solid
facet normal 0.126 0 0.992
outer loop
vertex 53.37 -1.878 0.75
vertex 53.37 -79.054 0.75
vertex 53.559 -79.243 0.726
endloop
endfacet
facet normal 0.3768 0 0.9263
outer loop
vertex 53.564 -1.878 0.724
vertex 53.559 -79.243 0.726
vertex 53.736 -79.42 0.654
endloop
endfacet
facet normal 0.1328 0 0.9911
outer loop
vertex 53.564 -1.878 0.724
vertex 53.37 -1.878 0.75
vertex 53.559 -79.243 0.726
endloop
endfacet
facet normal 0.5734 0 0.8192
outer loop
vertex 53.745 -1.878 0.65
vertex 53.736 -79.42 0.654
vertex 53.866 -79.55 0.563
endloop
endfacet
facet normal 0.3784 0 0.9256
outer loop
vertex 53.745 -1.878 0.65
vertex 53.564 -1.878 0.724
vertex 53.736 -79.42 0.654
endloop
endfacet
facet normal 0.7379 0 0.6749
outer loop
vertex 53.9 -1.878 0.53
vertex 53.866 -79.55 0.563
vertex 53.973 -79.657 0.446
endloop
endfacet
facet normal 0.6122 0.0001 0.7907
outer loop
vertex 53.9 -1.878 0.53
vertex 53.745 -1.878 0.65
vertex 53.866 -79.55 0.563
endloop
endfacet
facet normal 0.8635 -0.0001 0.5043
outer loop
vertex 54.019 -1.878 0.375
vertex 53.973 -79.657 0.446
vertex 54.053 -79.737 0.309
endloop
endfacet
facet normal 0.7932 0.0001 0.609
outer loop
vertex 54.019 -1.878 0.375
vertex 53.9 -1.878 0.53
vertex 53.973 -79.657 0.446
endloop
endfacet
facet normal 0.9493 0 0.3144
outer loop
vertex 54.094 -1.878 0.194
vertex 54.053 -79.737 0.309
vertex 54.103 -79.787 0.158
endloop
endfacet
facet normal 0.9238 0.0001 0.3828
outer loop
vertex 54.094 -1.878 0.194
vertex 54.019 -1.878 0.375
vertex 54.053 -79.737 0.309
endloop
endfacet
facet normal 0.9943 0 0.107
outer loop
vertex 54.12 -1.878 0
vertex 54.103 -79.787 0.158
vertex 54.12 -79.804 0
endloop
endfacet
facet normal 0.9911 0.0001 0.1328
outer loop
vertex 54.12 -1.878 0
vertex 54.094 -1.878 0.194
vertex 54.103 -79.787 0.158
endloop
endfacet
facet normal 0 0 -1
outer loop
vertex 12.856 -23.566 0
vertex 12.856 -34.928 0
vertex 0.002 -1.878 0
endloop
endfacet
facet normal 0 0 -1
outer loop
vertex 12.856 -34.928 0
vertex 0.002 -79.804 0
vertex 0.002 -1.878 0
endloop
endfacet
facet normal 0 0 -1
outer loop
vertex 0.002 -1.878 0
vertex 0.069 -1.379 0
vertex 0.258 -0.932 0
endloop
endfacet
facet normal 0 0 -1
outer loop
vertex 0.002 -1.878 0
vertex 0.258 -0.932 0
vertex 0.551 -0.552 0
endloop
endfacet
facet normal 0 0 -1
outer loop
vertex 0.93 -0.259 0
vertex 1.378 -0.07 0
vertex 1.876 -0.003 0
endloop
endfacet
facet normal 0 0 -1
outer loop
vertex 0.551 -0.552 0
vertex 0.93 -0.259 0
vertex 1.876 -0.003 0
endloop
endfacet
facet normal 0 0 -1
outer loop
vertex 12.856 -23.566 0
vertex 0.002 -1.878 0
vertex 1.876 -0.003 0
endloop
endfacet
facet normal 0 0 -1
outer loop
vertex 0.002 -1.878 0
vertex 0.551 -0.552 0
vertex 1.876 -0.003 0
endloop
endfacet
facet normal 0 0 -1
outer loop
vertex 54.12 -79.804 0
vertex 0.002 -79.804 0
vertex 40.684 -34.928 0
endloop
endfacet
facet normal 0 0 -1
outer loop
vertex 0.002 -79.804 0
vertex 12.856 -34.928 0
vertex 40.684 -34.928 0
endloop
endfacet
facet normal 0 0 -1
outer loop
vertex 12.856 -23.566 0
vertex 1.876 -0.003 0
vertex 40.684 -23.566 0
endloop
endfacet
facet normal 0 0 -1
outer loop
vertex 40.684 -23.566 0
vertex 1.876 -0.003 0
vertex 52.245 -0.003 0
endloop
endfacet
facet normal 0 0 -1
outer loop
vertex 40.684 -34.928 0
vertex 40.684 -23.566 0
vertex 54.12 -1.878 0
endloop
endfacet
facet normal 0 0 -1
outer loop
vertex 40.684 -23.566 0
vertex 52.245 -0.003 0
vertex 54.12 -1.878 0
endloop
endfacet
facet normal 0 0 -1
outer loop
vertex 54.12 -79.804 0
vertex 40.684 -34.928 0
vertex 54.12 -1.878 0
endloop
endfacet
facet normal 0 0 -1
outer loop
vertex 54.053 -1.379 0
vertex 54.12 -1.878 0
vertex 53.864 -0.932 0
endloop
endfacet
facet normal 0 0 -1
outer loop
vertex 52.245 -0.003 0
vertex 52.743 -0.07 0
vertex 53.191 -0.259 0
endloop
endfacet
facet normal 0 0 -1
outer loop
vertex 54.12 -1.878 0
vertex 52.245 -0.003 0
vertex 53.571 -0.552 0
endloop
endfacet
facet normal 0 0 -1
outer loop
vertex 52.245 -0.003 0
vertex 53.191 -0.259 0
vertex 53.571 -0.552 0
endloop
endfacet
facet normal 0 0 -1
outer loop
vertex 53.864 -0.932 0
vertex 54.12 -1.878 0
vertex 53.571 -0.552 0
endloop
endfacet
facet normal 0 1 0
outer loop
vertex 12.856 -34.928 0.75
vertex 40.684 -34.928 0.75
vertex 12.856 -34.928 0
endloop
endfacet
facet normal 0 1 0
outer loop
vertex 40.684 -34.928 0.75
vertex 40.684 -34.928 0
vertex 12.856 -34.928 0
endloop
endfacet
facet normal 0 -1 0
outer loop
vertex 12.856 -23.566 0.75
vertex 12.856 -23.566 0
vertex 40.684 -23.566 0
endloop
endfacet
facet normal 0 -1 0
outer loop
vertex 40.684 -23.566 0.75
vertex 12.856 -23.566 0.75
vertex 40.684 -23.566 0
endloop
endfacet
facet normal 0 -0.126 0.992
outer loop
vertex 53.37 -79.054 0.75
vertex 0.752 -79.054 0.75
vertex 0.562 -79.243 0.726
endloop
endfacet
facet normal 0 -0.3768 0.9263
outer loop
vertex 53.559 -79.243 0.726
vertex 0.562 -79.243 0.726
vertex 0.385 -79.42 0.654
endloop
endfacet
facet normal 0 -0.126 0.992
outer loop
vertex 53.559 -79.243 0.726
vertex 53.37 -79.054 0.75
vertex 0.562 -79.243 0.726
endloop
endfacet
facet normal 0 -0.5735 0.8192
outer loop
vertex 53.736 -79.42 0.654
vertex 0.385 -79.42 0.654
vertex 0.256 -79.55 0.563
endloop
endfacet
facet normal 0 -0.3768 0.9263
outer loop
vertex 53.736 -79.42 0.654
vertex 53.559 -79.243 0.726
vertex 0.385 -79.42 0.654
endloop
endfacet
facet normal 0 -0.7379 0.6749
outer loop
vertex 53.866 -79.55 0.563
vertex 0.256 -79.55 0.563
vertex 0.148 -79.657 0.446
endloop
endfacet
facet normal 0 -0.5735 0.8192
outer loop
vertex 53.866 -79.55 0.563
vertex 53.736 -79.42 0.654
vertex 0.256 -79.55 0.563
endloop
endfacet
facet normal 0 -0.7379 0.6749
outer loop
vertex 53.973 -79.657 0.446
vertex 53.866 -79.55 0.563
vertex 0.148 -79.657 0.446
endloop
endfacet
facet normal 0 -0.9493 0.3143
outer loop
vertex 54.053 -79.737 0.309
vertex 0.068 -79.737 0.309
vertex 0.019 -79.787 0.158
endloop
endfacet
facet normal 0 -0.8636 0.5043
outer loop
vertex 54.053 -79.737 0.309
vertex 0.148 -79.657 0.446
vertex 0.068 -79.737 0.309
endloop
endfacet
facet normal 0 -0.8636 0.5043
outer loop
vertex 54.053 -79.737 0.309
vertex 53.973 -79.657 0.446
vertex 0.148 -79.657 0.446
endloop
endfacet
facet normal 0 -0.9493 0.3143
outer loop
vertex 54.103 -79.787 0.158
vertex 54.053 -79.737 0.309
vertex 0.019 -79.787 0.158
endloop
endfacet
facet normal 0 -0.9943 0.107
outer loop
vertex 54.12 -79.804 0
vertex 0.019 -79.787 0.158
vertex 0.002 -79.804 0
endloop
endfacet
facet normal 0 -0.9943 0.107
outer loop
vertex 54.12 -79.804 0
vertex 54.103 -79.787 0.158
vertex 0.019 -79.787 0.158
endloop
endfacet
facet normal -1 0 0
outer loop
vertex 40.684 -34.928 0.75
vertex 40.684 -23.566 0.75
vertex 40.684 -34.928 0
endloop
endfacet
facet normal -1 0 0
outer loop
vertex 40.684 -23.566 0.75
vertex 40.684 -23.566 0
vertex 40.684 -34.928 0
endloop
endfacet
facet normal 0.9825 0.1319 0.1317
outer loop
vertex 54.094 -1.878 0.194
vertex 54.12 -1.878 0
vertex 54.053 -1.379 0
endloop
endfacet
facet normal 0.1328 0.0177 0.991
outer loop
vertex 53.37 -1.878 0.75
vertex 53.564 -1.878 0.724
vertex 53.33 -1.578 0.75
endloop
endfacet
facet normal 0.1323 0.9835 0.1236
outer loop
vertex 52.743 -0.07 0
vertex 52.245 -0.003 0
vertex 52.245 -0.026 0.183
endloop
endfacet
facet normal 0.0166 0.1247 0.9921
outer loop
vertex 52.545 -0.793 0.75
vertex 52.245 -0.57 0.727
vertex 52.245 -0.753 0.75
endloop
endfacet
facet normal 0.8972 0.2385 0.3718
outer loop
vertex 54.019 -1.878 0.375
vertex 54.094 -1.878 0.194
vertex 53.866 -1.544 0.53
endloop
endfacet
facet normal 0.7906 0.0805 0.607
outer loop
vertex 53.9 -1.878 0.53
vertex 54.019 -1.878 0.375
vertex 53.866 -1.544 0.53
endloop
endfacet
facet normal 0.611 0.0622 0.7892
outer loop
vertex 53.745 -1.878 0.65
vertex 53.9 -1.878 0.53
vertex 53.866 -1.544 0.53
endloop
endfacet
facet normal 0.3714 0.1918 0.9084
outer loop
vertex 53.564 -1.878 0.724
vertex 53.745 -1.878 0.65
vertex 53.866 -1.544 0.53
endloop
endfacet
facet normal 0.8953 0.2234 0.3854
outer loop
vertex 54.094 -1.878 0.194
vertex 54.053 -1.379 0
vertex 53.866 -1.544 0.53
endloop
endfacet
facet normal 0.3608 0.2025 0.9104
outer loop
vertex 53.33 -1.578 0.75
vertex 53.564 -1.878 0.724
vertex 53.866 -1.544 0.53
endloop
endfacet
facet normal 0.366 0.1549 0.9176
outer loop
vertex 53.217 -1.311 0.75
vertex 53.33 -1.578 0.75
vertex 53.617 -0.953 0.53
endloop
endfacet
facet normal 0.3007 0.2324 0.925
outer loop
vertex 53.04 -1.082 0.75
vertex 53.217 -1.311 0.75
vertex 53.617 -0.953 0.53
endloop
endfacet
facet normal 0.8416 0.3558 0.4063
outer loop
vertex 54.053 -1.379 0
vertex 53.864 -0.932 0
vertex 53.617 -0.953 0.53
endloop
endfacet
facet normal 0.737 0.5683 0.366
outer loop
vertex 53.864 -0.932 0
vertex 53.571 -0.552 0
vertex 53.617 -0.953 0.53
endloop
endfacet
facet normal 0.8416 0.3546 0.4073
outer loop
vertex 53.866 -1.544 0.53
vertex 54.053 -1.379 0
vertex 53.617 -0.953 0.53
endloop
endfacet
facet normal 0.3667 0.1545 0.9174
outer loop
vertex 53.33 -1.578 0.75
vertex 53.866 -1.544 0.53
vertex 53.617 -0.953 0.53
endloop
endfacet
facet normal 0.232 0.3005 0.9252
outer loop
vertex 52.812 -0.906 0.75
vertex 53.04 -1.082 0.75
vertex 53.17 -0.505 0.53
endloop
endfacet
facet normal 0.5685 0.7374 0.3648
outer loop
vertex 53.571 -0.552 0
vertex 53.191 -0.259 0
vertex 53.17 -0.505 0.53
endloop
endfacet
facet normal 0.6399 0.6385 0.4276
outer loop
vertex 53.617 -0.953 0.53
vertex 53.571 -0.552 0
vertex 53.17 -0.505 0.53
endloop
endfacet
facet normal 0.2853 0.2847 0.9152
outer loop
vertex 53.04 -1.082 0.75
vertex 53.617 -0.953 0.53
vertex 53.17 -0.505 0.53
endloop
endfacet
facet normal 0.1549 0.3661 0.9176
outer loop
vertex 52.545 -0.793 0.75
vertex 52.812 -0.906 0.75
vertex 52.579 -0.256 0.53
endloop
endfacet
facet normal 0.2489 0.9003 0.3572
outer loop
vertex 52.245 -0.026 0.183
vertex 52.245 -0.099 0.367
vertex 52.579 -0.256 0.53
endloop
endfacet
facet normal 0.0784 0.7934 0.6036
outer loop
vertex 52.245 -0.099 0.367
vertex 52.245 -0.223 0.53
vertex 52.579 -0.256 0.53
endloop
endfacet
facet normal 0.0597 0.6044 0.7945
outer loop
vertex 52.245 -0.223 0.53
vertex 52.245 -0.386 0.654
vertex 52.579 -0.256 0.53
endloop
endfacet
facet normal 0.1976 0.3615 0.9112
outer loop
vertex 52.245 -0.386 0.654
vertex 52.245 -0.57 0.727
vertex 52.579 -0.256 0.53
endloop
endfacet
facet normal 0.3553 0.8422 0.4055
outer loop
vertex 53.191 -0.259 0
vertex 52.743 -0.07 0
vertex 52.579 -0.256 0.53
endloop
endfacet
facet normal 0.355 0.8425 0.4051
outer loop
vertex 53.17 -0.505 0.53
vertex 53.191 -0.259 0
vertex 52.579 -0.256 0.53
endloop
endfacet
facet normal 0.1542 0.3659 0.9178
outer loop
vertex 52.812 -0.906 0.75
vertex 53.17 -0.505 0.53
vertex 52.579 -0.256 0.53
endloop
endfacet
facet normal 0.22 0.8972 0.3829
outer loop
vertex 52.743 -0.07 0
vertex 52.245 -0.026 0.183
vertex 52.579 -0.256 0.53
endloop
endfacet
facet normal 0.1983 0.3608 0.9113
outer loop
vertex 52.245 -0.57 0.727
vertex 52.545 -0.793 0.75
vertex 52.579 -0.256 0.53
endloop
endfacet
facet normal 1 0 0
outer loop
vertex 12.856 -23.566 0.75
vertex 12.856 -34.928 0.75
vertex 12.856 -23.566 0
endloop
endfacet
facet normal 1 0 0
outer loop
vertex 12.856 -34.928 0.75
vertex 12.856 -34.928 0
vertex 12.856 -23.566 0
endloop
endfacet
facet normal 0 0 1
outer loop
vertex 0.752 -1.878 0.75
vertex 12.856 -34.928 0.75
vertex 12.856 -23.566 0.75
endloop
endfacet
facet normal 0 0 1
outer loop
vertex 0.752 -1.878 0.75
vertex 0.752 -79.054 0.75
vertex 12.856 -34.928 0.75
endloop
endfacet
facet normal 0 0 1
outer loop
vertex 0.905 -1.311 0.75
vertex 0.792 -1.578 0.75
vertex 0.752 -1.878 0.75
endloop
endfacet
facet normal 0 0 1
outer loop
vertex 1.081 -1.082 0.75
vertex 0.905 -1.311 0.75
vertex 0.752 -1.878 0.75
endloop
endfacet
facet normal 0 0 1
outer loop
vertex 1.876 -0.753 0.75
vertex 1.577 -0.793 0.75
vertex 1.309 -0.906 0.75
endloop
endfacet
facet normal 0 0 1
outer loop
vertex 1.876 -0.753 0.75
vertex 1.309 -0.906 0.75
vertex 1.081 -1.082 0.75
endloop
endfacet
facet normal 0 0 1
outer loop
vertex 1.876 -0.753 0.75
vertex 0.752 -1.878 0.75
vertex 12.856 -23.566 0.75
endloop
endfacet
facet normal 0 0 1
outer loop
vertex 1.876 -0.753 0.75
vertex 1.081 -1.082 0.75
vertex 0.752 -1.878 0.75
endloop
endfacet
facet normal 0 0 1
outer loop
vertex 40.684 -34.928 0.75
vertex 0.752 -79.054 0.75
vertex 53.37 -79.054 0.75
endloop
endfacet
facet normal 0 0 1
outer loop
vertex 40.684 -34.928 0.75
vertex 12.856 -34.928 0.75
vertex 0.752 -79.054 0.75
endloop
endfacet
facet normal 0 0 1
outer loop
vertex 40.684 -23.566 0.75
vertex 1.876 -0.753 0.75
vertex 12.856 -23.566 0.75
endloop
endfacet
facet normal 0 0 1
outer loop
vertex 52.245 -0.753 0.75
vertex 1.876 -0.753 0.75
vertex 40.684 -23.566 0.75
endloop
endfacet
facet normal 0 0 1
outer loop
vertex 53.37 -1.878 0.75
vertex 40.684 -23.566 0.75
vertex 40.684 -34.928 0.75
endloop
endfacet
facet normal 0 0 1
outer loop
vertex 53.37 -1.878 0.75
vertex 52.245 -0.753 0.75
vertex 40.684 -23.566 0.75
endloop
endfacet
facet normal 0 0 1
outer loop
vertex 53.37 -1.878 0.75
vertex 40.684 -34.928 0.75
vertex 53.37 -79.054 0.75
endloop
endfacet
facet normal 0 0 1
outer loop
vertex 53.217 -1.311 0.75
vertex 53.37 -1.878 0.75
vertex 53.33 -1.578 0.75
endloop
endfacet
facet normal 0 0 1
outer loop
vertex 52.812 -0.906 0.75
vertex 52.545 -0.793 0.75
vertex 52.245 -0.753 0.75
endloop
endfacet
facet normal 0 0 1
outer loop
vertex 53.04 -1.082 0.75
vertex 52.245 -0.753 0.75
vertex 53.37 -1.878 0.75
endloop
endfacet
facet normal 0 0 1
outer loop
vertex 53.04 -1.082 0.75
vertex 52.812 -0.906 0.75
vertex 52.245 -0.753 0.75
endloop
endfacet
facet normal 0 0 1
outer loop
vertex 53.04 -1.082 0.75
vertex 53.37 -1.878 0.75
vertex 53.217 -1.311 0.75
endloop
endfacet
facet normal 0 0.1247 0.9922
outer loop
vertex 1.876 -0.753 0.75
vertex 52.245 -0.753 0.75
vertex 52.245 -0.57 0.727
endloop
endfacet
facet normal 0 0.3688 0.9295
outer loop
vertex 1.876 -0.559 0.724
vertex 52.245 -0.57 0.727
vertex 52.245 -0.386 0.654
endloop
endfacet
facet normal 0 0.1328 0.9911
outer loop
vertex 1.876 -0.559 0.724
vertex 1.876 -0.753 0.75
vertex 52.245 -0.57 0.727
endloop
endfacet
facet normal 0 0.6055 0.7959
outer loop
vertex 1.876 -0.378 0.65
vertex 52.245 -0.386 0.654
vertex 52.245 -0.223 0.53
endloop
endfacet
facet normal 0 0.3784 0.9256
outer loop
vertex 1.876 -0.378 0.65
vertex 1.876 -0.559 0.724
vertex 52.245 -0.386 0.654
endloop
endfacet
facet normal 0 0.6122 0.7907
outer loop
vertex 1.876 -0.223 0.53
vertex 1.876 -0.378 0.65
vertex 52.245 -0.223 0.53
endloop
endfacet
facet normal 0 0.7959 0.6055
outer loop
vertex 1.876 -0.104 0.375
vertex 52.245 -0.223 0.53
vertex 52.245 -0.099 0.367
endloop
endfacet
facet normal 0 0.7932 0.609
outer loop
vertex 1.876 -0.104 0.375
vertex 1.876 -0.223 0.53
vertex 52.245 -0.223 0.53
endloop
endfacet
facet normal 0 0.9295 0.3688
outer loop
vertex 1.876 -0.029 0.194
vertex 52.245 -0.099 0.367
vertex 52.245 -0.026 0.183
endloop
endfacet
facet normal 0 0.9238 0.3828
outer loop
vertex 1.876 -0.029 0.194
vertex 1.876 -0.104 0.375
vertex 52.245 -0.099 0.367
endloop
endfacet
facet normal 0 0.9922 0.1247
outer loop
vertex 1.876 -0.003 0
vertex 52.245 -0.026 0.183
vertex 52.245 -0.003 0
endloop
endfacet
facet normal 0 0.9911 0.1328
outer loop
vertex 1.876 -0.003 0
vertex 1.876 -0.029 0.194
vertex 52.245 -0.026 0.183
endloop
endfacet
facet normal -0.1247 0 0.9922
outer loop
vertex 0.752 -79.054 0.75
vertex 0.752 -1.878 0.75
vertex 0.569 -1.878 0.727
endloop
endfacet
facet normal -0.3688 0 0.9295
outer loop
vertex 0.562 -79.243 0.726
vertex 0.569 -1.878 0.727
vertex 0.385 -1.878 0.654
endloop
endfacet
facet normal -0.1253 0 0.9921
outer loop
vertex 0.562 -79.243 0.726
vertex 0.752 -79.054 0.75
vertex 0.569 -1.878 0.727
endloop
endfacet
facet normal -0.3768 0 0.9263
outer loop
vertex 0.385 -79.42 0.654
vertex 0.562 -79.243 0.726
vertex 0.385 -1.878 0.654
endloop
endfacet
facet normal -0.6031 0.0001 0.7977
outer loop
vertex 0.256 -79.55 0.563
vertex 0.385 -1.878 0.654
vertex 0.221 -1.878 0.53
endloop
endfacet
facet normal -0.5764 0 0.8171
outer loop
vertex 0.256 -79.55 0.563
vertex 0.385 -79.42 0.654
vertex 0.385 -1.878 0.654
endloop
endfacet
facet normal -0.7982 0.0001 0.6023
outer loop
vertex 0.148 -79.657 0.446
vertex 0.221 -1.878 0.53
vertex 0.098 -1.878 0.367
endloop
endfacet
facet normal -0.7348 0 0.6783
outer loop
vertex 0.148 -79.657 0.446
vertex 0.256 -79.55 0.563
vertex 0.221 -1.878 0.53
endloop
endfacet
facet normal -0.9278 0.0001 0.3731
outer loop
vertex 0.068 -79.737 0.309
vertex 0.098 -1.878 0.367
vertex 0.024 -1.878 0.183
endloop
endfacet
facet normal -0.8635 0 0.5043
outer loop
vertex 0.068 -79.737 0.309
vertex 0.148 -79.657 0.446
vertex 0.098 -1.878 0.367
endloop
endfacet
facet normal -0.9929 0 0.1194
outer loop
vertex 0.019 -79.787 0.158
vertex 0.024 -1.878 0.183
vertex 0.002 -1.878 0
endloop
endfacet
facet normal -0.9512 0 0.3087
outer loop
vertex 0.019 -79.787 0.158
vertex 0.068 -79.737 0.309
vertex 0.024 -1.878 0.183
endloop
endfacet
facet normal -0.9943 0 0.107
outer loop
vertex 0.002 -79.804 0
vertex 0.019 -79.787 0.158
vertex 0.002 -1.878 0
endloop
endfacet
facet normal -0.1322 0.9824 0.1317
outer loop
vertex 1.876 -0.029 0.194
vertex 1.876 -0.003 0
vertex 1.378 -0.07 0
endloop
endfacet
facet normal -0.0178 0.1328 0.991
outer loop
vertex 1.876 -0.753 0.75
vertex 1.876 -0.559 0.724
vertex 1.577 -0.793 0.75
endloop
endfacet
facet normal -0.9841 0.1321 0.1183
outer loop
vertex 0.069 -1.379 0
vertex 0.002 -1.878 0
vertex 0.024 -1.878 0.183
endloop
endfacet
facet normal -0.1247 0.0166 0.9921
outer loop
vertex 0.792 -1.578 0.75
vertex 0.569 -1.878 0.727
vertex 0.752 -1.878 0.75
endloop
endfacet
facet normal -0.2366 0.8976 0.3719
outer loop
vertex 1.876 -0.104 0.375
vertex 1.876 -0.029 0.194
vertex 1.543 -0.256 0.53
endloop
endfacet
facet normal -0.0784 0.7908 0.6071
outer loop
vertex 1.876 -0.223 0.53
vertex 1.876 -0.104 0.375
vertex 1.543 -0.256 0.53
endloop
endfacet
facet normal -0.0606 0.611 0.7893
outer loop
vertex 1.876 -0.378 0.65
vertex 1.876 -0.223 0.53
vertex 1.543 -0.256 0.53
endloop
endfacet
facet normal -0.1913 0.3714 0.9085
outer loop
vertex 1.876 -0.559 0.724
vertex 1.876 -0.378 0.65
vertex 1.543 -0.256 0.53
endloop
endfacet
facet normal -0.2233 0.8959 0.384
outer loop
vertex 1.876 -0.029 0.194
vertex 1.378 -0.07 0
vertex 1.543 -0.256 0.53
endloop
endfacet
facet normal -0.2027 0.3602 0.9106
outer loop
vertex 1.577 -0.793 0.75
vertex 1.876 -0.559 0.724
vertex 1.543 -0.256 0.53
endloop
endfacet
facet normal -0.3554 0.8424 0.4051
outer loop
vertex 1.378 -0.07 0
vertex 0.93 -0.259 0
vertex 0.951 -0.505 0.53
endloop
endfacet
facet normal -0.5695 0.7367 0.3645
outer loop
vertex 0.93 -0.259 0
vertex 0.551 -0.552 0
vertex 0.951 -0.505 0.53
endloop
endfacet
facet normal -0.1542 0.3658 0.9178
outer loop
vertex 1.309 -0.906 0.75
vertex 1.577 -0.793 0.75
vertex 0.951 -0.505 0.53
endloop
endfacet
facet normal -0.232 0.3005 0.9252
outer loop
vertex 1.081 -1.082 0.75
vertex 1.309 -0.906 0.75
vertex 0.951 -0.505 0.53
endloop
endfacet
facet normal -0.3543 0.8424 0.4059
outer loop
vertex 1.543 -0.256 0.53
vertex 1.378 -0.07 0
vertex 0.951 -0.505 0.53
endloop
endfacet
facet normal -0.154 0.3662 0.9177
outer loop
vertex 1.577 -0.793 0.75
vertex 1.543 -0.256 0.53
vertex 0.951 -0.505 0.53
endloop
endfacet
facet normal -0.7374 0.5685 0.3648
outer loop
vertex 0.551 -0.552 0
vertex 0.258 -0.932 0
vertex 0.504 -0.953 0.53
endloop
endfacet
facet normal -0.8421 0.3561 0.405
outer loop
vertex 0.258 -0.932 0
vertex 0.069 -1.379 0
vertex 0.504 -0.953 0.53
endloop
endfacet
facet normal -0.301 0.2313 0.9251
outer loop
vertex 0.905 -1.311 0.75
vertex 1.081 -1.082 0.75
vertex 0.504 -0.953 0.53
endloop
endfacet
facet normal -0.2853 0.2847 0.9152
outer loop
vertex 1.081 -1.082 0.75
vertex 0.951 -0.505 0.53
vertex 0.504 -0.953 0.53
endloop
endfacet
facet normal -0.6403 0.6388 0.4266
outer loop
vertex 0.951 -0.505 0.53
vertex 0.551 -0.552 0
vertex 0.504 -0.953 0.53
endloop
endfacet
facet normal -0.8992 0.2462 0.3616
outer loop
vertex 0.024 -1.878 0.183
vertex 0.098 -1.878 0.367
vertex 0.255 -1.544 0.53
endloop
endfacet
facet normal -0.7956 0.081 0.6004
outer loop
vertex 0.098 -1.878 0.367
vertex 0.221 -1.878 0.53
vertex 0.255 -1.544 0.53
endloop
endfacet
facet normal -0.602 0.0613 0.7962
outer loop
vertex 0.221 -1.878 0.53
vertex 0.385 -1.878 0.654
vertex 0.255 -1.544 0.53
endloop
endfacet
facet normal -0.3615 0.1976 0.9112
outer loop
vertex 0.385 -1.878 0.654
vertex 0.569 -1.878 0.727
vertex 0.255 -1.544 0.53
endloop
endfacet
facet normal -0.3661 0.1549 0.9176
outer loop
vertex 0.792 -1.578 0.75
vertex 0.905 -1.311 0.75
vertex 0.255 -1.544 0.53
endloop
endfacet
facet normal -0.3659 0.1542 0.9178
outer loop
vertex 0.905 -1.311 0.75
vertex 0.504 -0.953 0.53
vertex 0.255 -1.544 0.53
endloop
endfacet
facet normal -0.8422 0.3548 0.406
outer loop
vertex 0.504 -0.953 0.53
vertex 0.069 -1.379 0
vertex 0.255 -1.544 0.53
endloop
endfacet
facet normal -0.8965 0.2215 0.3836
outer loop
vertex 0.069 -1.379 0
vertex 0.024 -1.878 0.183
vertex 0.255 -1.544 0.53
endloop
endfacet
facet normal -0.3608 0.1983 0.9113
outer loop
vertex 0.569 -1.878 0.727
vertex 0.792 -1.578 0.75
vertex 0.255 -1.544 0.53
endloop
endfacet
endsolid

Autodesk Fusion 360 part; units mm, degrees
sketch "Sketch1" plane through (0, 0, 0) normal (0, 0, 1) x (1, 0, 0)
  line L0 (52.245, -0.0032) -> (1.8763, -0.0032)
  spline S0 degree 3 poles (1.8763, -0.0032) (0.841, -0.0032) (0.0018, -0.8424) (0.0018, -1.8778) knots 0 0 0 0 1 1 1 1
  line L1 (0.0018, -1.8778) -> (0.0018, -79.8036)
  line L2 (0.0018, -79.8036) -> (54.1196, -79.8036)
  line L3 (54.1196, -79.8036) -> (54.1196, -1.8778)
  spline S1 degree 3 poles (54.1196, -1.8778) (54.1196, -0.8424) (53.2804, -0.0032) (52.245, -0.0032) knots 0 0 0 0 1 1 1 1
  line L4 (40.6841, -34.9282) -> (12.8563, -34.9282)
  line L5 (12.8563, -34.9282) -> (12.8563, -23.5656)
  line L6 (12.8563, -23.5656) -> (40.6841, -23.5656)
  line L7 (40.6841, -23.5656) -> (40.6841, -34.9282)
extrude "Extrude1" add sketch "Sketch1" along normal blind 0.75
extrude "Extrude2" [suppressed]
fillet "Fillet1" radius 0.75 6 edges at (54.1196, -40.8407, 0.75) (53.5706, -0.5522, 0.75) (27.0607, -0.0032, 0.75) (0.5508, -0.5522, 0.75) (0.0018, -40.8407, 0.75) (27.0607, -79.8036, 0.75)
equation "d9 = 2.25 mm - 1.5 mm"
equation "d14 = d9"
